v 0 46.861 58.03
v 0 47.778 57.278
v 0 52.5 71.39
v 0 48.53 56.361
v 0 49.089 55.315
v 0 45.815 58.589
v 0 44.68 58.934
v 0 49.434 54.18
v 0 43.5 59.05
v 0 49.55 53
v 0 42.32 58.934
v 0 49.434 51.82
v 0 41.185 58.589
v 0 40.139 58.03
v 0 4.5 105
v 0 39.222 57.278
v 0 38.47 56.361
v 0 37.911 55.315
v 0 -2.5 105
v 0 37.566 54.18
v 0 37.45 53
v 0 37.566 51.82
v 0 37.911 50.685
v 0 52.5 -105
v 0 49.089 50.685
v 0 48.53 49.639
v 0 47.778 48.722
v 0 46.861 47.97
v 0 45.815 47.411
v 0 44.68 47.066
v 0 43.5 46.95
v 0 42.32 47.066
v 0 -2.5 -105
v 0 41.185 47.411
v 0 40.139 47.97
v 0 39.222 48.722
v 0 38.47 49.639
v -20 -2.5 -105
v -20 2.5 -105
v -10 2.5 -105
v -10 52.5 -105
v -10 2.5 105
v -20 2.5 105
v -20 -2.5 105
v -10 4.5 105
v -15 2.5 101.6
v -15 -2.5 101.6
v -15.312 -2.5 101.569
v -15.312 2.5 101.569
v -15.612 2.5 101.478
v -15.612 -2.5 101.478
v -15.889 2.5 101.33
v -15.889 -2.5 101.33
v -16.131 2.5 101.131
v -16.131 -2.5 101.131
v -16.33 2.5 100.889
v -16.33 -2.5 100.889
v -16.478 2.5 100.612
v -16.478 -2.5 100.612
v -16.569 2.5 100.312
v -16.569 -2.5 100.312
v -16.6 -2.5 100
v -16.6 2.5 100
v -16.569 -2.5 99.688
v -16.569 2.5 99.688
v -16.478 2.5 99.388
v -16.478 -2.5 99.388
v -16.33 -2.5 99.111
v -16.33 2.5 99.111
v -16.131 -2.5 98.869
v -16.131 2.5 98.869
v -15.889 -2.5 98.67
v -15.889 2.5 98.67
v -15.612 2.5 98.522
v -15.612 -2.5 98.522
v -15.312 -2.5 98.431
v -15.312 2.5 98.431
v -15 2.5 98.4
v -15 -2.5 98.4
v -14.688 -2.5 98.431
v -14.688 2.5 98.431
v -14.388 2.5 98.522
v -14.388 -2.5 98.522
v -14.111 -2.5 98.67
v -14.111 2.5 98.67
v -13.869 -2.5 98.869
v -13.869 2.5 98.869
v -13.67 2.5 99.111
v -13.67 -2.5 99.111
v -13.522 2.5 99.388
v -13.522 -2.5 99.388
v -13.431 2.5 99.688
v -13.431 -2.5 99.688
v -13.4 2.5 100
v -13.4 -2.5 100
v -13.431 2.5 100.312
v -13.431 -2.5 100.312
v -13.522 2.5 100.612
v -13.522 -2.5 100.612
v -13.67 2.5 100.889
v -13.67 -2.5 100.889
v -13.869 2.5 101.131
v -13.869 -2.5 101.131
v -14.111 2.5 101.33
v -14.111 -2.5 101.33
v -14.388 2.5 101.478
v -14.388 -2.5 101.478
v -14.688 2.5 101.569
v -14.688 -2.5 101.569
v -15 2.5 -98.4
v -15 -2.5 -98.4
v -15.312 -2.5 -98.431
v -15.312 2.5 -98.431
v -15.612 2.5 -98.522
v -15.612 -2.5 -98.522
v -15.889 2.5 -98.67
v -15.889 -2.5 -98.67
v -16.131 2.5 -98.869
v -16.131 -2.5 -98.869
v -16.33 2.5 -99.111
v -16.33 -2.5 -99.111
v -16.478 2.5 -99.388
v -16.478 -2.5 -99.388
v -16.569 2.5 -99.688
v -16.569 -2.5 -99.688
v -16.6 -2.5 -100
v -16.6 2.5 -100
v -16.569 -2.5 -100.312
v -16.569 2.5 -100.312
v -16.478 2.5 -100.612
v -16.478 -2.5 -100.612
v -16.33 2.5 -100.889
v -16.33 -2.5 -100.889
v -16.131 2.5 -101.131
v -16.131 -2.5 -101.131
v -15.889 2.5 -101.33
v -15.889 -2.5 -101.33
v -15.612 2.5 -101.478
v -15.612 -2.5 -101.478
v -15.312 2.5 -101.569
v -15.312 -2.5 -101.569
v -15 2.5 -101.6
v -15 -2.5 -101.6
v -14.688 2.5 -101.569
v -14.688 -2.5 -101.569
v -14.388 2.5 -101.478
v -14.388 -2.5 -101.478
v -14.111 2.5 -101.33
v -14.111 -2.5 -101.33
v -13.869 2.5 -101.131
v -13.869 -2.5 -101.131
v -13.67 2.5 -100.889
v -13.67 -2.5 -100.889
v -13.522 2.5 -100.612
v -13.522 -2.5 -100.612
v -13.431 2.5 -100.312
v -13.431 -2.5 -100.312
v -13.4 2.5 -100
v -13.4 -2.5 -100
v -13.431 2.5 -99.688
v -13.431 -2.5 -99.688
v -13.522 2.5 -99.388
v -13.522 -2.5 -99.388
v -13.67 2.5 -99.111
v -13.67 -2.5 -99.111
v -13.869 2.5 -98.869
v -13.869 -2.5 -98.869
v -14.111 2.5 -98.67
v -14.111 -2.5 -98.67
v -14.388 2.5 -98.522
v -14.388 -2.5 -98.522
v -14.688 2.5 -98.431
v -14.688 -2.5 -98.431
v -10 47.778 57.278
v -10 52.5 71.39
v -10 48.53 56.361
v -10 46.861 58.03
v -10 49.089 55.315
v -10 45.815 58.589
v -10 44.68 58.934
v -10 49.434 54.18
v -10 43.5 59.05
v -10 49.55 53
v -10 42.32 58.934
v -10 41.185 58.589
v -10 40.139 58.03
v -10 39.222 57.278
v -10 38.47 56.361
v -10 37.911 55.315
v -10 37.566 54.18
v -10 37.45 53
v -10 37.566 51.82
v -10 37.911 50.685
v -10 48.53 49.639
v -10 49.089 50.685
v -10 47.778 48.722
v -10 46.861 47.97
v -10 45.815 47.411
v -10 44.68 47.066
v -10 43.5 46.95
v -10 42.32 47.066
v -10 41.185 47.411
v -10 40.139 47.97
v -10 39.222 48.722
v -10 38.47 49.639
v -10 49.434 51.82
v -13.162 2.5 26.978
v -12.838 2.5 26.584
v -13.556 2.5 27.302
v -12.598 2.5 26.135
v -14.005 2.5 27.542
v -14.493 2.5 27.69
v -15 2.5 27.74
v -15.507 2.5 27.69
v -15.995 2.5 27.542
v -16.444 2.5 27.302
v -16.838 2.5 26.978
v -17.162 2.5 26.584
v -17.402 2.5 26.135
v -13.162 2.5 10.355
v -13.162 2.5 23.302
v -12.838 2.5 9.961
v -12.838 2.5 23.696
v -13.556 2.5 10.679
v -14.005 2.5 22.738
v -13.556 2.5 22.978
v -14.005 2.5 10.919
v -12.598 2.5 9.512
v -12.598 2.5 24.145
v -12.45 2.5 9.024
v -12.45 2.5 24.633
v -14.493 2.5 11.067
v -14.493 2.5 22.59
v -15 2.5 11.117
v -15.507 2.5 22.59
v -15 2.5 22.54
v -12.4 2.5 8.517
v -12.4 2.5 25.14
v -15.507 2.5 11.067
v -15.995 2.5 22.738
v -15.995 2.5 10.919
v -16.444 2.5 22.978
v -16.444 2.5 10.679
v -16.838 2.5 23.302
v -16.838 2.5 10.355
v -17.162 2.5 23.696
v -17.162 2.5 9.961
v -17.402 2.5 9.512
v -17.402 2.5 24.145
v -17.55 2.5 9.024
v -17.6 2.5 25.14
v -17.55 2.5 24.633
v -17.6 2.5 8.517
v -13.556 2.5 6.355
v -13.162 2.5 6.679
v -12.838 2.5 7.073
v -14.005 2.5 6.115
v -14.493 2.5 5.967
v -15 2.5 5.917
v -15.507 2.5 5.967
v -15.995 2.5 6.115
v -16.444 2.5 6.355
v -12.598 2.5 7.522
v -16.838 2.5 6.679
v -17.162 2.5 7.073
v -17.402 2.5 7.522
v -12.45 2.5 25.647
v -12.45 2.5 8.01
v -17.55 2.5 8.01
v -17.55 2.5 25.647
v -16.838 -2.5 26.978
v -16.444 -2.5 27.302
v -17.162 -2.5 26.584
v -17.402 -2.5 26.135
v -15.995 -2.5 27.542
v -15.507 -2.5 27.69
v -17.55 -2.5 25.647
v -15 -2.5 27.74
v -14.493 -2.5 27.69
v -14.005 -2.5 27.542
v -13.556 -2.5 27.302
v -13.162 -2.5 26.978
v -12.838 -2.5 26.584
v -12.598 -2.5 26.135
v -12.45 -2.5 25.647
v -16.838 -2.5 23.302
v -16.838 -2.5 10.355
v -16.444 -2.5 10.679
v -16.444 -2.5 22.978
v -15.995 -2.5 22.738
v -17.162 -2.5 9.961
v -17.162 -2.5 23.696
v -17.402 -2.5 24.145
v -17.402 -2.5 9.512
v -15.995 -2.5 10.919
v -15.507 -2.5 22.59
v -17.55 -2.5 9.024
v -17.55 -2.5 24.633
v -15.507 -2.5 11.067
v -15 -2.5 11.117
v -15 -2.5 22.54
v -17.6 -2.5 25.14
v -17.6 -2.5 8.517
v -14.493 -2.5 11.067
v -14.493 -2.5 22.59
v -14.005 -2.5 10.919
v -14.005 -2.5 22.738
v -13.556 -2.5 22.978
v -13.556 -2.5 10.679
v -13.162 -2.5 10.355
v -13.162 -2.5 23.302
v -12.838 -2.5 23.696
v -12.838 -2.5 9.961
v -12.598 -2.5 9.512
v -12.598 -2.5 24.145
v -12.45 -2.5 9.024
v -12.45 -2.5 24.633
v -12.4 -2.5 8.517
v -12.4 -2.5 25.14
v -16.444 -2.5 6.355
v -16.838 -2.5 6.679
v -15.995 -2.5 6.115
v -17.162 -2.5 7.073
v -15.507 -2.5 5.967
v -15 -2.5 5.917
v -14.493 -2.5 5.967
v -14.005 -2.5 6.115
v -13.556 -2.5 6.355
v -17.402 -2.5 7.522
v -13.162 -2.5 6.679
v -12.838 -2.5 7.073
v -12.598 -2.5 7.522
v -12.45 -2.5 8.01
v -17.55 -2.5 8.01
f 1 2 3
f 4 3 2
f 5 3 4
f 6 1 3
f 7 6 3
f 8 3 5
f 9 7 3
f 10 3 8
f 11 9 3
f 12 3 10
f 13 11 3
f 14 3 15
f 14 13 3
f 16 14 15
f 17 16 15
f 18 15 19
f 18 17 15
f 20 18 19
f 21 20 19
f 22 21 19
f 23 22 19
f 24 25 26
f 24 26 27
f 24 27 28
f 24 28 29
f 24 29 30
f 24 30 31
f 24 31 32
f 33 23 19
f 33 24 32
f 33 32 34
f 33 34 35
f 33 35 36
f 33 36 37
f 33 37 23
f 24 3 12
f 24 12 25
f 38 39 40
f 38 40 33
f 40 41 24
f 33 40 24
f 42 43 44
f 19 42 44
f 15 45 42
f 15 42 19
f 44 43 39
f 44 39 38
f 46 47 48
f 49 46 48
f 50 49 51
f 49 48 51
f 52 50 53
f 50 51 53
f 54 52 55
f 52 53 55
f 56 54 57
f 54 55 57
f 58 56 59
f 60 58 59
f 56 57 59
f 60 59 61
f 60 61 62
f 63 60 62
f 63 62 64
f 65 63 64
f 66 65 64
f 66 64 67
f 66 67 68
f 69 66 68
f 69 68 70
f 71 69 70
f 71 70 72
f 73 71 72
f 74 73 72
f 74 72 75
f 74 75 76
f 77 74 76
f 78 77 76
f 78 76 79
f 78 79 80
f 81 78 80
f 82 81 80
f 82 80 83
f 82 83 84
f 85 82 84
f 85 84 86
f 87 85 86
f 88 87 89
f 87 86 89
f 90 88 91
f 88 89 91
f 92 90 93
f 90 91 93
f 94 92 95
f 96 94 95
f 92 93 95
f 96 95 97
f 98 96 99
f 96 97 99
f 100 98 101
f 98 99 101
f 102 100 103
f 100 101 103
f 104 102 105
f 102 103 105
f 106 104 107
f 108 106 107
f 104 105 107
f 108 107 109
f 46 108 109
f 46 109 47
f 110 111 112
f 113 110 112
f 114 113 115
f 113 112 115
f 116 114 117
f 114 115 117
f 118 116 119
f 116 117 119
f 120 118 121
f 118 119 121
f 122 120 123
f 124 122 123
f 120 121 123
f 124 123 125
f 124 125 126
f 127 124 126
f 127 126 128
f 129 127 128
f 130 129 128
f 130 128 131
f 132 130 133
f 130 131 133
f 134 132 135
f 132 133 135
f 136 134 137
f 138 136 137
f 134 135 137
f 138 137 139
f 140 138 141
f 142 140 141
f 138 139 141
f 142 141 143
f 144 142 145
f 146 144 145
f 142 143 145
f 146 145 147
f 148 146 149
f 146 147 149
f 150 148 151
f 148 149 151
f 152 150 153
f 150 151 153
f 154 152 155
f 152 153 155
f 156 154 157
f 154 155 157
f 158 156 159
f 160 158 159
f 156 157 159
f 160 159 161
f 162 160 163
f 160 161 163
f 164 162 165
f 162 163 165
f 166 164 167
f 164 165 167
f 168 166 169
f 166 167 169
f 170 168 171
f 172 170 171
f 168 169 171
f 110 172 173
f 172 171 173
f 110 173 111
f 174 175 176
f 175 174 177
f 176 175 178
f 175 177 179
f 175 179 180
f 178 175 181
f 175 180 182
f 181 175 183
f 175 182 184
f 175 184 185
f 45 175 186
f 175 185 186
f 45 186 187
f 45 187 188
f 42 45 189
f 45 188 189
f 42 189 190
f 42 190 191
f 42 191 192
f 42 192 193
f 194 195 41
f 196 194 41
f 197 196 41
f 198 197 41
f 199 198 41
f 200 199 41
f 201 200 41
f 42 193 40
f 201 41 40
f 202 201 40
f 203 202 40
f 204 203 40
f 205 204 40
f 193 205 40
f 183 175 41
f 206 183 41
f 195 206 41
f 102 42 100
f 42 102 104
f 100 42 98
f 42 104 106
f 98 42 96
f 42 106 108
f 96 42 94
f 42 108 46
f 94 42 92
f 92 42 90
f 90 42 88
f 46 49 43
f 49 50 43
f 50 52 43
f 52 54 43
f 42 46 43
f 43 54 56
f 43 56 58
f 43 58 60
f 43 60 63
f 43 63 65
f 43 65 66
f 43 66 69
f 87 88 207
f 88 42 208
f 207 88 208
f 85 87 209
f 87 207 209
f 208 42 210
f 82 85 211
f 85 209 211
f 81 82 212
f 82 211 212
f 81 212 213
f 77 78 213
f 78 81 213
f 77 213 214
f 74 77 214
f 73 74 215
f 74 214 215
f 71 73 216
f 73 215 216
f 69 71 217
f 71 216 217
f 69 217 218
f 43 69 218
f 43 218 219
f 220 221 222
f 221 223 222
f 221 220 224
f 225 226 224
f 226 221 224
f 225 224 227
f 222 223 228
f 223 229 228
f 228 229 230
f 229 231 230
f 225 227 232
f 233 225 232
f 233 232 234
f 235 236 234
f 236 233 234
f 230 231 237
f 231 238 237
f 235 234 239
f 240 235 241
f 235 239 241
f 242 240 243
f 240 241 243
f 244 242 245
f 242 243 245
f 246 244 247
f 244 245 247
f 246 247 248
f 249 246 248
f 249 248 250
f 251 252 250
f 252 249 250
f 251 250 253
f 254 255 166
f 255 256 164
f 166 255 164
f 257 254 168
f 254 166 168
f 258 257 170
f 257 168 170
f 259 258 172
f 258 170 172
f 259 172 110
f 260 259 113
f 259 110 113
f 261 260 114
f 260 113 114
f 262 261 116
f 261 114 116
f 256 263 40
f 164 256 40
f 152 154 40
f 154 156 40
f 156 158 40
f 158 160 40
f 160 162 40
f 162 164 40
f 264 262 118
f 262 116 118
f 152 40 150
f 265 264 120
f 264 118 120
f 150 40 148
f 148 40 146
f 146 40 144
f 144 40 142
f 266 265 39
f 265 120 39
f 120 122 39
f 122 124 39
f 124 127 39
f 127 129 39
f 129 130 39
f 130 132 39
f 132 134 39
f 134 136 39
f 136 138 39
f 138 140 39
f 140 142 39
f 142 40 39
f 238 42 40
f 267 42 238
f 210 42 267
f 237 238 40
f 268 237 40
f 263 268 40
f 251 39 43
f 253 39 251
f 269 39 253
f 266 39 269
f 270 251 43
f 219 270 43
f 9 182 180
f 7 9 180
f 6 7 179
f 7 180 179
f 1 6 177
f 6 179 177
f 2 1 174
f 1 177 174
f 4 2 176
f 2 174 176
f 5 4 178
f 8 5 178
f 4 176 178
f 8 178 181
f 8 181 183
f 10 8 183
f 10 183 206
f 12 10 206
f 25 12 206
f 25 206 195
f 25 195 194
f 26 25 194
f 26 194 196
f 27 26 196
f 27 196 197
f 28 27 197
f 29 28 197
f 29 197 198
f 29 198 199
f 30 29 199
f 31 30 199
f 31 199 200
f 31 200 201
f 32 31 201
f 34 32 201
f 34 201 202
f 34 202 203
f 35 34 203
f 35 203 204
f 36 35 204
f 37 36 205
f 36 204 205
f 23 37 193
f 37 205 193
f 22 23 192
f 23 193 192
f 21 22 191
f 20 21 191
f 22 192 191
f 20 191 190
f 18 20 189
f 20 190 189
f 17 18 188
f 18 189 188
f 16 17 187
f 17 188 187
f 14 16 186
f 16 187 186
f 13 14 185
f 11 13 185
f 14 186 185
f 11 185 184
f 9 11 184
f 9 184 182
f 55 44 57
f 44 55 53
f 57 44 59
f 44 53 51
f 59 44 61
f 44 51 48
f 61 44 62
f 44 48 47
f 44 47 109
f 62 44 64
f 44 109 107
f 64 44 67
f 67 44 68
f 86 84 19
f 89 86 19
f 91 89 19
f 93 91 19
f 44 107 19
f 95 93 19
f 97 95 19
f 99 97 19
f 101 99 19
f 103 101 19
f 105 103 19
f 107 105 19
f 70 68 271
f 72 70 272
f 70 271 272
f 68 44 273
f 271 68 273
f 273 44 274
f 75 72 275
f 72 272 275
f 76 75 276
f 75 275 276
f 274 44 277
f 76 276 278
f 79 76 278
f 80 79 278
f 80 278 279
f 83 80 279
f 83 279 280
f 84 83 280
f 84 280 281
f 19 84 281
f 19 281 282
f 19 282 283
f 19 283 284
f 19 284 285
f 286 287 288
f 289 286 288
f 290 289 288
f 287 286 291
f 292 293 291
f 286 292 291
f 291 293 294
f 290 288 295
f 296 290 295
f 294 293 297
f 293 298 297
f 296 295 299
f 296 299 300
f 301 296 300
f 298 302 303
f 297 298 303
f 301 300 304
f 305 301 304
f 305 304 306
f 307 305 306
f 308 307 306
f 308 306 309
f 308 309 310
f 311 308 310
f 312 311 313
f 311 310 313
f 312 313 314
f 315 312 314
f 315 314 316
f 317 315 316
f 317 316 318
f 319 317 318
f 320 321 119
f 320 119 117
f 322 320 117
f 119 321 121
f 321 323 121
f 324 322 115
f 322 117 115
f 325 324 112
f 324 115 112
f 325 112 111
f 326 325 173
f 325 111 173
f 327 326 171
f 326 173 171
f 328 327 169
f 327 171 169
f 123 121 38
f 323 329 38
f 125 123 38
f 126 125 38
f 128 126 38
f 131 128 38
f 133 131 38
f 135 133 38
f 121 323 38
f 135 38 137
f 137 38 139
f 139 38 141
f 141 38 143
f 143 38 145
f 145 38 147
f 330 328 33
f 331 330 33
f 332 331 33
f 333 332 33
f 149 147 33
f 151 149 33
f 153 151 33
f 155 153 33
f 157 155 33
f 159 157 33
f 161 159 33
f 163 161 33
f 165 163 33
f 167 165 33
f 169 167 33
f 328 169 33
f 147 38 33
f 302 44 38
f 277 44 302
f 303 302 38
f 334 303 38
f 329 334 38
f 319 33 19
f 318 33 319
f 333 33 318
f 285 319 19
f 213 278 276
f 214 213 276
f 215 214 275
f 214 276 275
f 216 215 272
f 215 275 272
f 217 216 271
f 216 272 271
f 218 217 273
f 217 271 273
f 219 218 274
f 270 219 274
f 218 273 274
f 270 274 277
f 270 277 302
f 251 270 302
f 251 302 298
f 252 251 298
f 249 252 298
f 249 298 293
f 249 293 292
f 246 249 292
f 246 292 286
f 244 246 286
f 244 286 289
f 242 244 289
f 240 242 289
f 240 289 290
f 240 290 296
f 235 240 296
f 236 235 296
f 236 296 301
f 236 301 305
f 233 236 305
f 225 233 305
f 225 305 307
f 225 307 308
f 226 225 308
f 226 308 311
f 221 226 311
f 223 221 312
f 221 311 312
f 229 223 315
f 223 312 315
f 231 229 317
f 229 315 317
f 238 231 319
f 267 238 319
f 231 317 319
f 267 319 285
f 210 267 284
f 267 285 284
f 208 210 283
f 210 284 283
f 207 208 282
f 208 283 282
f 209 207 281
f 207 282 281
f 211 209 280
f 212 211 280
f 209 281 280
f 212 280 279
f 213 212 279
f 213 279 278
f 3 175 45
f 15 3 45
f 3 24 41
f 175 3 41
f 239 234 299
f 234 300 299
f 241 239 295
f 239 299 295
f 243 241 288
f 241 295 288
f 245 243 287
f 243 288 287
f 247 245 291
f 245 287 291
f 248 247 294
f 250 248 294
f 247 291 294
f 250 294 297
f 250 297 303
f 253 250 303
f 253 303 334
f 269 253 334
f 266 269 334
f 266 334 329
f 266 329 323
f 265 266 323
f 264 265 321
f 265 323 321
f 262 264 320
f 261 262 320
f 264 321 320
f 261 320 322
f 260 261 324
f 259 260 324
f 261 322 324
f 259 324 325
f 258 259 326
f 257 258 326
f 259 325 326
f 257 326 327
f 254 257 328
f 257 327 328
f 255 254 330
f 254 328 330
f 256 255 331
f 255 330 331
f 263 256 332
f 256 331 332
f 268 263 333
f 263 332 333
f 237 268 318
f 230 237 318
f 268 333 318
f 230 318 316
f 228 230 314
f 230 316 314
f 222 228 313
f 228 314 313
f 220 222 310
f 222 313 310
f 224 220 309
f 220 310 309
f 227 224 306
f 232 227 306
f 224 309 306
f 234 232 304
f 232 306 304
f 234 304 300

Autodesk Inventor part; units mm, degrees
ref_plane "YZ Plane" through (0, 0, 0) normal (1, 0, 0) x (0, 1, 0)
ref_plane "XZ Plane" through (0, 0, 0) normal (0, 1, 0) x (-1, 0, 0)
ref_plane "XY Plane" through (0, 0, 0) normal (0, 0, 1) x (1, 0, 0)
sketch "スケッチ1" plane through (0, 0, 0) normal (0, 0, 1) x (1, 0, 0)
  line L0 (-20, -2.5) -> (20, -2.5)
  line L1 (20, -2.5) -> (20, 2.5)
  line L2 (-20, 2.5) -> (-20, -2.5)
  line L3 (-20, -2.5) -> (20, 2.5) construction
  line L4 (20, -2.5) -> (-20, 2.5) construction
  line L5 (-10, 2.5) -> (10, 2.5)
  line L6 (10, 2.5) -> (10, 52.5)
  line L7 (10, 52.5) -> (-10, 52.5)
  line L8 (-10, 52.5) -> (-10, 2.5)
  line L9 (-10, 2.5) -> (10, 52.5) construction
  line L10 (10, 2.5) -> (-10, 52.5) construction
  line L11 (20, 2.5) -> (10, 2.5)
  line L12 (-10, 2.5) -> (-20, 2.5)
  line L13 (0, 52.5) -> (0, -2.5)
  point P0 (0, 0)
  point P1 (0, 27.5)
  point P2 (0, 27.5)
  point P3 (0, 0)
  dimension "d0" = 20
  dimension "d1" = 50
  dimension "d2" = 5
  dimension "d3" = 10
extrude "押し出し1" add sketch "スケッチ1" along normal mid plane 210 contours L2 L12 L5 L13 L0 | L5 L8 L7 L13
sketch "スケッチ8" plane through (-10, 2.5, 105) normal (-1, 0, 0) x (0, 0, 1)
  line L0 (-210, 50) -> (0, 50) projected
  line L1 (-33.61, 50) -> (0, 2)
  line L2 (0, -5) -> (0, 50) projected
  line L3 (-210, 0) -> (0, 0) projected
  point P0 (-105, -2.5)
  dimension "d60" = 2
  dimension "d68" = 145
extrude "押し出し5" cut sketch "スケッチ8" against normal blind 210
sketch "スケッチ9" plane through (-10, 2.5, -105) normal (-1, 0, 0) x (0, 0, 1)
  circle A0 centre (158, 41) radius 6.05
  line L0 (210, 2) -> (210, 0) projected
  line L1 (0, 0) -> (210, 0) projected
  point P0 (105, -2.5)
  dimension "d63" = 12.1
  dimension "d64" = 52
  dimension "d65" = 41
extrude "押し出し6" cut sketch "スケッチ9" against normal blind 210
sketch "スケッチ10" plane through (-20, 2.5, 105) normal (0, 1, 0) x (1, 0, 0)
  line L0 (0, 210) -> (0, 0) projected
  line L1 (10, 0) -> (0, 0) projected
  line L2 (0, 210) -> (10, 210) projected
  point P0 (20, 105)
  point P1 (5, 5)
  point P2 (5, 79.86)
  point P3 (5, 96.483)
  point P4 (5, 205)
  dimension "d69" = 5
  dimension "d70" = 5
  dimension "d71" = 74.86
  dimension "d72" = 16.623
  dimension "d73" = 5
hole "穴5" at (-15, 2.5, -100) at (-15, 2.5, 100) direction (0, -1, 0) diameter 3.2 end through all
hole "穴6" at (-15, 2.5, 25.14) at (-15, 2.5, 8.517) direction (0, -1, 0) diameter 5.2 end through all
properties part number "s_base4"
